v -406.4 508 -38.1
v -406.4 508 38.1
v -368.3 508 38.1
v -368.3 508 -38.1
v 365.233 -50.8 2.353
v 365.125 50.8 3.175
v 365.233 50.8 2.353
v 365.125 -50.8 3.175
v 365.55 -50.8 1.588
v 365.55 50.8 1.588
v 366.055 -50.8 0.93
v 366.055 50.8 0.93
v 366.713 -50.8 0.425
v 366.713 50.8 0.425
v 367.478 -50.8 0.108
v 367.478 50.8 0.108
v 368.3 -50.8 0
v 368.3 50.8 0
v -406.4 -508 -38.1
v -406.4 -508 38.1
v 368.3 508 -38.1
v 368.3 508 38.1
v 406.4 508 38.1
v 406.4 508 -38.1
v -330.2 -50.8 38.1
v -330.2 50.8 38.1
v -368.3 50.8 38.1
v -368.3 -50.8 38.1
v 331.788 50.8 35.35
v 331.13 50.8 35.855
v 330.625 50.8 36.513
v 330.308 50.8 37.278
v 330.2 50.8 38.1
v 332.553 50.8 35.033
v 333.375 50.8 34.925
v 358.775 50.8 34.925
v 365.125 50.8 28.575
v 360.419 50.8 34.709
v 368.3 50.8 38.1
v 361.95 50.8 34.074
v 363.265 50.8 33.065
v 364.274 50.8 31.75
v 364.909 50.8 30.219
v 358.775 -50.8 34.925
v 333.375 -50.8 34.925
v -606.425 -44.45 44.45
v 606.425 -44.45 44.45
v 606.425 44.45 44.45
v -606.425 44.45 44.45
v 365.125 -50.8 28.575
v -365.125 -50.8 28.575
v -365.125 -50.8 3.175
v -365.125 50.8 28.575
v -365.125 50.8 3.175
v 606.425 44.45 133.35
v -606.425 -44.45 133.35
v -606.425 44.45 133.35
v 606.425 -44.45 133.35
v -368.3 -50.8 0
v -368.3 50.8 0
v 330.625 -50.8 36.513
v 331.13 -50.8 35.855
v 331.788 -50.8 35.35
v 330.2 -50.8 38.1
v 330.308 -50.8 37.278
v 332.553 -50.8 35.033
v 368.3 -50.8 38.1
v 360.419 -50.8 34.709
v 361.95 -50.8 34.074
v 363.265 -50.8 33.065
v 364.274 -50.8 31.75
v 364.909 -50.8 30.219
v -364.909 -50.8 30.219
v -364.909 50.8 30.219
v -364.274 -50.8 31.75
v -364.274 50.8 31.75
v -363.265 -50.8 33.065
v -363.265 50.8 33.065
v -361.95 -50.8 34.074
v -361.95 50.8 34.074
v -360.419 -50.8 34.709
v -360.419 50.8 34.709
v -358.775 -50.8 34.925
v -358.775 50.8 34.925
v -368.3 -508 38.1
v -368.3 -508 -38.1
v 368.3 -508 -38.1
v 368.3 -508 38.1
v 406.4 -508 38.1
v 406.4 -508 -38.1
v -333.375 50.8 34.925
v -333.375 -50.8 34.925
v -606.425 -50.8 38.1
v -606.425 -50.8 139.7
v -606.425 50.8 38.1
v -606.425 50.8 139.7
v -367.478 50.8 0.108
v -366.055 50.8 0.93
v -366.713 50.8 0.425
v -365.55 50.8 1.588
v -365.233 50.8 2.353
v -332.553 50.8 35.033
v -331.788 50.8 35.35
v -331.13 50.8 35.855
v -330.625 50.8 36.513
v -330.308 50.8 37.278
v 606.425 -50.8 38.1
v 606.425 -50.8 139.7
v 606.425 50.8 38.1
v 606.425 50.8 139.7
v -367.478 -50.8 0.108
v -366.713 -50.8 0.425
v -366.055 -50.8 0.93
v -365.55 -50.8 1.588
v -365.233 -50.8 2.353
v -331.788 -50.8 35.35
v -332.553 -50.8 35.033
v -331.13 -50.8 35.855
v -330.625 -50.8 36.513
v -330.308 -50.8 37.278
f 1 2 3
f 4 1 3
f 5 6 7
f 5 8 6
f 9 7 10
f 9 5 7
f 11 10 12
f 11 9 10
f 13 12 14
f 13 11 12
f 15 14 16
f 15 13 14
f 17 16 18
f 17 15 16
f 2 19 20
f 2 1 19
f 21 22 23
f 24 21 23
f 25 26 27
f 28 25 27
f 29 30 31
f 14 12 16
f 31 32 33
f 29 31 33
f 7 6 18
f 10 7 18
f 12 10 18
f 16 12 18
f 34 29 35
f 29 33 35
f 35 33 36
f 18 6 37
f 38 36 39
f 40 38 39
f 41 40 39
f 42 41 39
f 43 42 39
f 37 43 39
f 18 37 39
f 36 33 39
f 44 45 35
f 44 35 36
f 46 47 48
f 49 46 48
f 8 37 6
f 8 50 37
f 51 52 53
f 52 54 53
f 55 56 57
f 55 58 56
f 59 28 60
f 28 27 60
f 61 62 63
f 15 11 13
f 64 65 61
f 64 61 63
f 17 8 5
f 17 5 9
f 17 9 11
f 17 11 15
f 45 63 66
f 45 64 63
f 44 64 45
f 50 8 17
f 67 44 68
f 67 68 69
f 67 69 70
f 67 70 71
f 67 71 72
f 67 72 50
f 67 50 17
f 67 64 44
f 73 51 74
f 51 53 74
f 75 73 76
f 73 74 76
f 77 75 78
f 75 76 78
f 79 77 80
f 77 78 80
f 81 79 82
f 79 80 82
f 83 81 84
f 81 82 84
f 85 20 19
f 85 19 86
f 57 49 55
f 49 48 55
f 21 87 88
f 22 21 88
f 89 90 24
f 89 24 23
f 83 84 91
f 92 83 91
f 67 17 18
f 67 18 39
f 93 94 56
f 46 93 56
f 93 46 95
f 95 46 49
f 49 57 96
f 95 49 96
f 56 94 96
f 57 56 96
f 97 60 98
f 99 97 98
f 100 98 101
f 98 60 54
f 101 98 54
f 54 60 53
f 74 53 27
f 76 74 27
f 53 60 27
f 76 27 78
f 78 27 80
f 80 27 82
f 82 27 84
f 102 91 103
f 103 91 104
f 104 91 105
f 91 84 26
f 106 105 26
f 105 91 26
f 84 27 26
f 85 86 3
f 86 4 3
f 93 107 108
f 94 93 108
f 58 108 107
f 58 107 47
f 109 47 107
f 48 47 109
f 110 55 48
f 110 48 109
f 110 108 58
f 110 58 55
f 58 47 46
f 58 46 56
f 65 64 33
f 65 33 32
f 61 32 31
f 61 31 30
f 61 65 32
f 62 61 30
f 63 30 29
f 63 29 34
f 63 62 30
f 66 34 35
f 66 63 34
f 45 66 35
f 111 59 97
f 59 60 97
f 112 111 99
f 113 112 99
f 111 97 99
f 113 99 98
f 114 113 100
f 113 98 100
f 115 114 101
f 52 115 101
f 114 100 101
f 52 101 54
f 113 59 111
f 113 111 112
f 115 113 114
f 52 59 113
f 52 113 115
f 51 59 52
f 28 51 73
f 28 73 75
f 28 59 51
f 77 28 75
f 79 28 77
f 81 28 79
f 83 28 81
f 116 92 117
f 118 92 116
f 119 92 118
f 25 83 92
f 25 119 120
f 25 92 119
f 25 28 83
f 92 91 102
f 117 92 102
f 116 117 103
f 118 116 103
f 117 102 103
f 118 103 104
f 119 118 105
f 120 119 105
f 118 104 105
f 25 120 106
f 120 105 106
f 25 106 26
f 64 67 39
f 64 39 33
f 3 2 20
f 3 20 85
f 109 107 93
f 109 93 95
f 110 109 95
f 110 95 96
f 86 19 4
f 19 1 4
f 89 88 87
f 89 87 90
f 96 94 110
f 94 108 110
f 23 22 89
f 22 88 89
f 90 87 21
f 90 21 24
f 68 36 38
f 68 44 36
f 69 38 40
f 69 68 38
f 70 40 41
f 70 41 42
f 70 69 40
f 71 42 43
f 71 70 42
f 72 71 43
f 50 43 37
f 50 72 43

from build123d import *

# Parameters (mm, degrees)
F0_W     = 38.1
F0_H     = 76.2
F1_DEPTH = 508
F2_W     = 101.6
F2_H     = 101.6
F2_W_2   = 88.9
F2_H_2   = 88.9
F3_DEPTH = 606.425
F5_DEPTH = 50.8


with BuildPart() as f1:
    # F0 (on Front) → F1 (new body, symmetric)
    with BuildSketch(Plane.XZ):
        with Locations((-387.35, 0)):
            Rectangle(F0_W, F0_H)
        with Locations((387.35, 0)):
            Rectangle(F0_W, F0_H)
    extrude(amount=F1_DEPTH, both=True)


with BuildPart() as f3:
    # F2 (on Right) → F3 (new body, symmetric)
    with BuildSketch(Plane.YZ):
        with Locations((0, 88.9)):
            Rectangle(F2_W, F2_H)
        with Locations((0, 88.9)):
            Rectangle(F2_W_2, F2_H_2, mode=Mode.SUBTRACT)
    extrude(amount=F3_DEPTH, both=True)


with BuildPart() as f5:
    # F4 (on Front) → F5 (new body, symmetric)
    with BuildSketch(Plane.XZ):
        with BuildLine():
            Line((-330.2, 38.1), (-368.3, 38.1))
            Line((-368.3, 38.1), (-368.3, 0))
            ThreePointArc((-368.3, 0), (-366.054936, 0.929936), (-365.125, 3.175))
            Line((-365.125, 3.175), (-365.125, 28.575))
            ThreePointArc((-365.125, 28.575), (-363.265128, 33.065128), (-358.775, 34.925))
            Line((-358.775, 34.925), (-333.375, 34.925))
            ThreePointArc((-333.375, 34.925), (-331.129936, 35.854936), (-330.2, 38.1))
        make_face()
        with BuildLine():
            ThreePointArc((365.125, 3.175), (366.054936, 0.929936), (368.3, 0))
            Line((368.3, 0), (368.3, 38.1))
            Line((368.3, 38.1), (330.2, 38.1))
            ThreePointArc((330.2, 38.1), (331.129936, 35.854936), (333.375, 34.925))
            Line((333.375, 34.925), (358.775, 34.925))
            ThreePointArc((358.775, 34.925), (363.265128, 33.065128), (365.125, 28.575))
            Line((365.125, 28.575), (365.125, 3.175))
        make_face()
    extrude(amount=F5_DEPTH, both=True)


solid = Compound([f1.part, f3.part, f5.part])
